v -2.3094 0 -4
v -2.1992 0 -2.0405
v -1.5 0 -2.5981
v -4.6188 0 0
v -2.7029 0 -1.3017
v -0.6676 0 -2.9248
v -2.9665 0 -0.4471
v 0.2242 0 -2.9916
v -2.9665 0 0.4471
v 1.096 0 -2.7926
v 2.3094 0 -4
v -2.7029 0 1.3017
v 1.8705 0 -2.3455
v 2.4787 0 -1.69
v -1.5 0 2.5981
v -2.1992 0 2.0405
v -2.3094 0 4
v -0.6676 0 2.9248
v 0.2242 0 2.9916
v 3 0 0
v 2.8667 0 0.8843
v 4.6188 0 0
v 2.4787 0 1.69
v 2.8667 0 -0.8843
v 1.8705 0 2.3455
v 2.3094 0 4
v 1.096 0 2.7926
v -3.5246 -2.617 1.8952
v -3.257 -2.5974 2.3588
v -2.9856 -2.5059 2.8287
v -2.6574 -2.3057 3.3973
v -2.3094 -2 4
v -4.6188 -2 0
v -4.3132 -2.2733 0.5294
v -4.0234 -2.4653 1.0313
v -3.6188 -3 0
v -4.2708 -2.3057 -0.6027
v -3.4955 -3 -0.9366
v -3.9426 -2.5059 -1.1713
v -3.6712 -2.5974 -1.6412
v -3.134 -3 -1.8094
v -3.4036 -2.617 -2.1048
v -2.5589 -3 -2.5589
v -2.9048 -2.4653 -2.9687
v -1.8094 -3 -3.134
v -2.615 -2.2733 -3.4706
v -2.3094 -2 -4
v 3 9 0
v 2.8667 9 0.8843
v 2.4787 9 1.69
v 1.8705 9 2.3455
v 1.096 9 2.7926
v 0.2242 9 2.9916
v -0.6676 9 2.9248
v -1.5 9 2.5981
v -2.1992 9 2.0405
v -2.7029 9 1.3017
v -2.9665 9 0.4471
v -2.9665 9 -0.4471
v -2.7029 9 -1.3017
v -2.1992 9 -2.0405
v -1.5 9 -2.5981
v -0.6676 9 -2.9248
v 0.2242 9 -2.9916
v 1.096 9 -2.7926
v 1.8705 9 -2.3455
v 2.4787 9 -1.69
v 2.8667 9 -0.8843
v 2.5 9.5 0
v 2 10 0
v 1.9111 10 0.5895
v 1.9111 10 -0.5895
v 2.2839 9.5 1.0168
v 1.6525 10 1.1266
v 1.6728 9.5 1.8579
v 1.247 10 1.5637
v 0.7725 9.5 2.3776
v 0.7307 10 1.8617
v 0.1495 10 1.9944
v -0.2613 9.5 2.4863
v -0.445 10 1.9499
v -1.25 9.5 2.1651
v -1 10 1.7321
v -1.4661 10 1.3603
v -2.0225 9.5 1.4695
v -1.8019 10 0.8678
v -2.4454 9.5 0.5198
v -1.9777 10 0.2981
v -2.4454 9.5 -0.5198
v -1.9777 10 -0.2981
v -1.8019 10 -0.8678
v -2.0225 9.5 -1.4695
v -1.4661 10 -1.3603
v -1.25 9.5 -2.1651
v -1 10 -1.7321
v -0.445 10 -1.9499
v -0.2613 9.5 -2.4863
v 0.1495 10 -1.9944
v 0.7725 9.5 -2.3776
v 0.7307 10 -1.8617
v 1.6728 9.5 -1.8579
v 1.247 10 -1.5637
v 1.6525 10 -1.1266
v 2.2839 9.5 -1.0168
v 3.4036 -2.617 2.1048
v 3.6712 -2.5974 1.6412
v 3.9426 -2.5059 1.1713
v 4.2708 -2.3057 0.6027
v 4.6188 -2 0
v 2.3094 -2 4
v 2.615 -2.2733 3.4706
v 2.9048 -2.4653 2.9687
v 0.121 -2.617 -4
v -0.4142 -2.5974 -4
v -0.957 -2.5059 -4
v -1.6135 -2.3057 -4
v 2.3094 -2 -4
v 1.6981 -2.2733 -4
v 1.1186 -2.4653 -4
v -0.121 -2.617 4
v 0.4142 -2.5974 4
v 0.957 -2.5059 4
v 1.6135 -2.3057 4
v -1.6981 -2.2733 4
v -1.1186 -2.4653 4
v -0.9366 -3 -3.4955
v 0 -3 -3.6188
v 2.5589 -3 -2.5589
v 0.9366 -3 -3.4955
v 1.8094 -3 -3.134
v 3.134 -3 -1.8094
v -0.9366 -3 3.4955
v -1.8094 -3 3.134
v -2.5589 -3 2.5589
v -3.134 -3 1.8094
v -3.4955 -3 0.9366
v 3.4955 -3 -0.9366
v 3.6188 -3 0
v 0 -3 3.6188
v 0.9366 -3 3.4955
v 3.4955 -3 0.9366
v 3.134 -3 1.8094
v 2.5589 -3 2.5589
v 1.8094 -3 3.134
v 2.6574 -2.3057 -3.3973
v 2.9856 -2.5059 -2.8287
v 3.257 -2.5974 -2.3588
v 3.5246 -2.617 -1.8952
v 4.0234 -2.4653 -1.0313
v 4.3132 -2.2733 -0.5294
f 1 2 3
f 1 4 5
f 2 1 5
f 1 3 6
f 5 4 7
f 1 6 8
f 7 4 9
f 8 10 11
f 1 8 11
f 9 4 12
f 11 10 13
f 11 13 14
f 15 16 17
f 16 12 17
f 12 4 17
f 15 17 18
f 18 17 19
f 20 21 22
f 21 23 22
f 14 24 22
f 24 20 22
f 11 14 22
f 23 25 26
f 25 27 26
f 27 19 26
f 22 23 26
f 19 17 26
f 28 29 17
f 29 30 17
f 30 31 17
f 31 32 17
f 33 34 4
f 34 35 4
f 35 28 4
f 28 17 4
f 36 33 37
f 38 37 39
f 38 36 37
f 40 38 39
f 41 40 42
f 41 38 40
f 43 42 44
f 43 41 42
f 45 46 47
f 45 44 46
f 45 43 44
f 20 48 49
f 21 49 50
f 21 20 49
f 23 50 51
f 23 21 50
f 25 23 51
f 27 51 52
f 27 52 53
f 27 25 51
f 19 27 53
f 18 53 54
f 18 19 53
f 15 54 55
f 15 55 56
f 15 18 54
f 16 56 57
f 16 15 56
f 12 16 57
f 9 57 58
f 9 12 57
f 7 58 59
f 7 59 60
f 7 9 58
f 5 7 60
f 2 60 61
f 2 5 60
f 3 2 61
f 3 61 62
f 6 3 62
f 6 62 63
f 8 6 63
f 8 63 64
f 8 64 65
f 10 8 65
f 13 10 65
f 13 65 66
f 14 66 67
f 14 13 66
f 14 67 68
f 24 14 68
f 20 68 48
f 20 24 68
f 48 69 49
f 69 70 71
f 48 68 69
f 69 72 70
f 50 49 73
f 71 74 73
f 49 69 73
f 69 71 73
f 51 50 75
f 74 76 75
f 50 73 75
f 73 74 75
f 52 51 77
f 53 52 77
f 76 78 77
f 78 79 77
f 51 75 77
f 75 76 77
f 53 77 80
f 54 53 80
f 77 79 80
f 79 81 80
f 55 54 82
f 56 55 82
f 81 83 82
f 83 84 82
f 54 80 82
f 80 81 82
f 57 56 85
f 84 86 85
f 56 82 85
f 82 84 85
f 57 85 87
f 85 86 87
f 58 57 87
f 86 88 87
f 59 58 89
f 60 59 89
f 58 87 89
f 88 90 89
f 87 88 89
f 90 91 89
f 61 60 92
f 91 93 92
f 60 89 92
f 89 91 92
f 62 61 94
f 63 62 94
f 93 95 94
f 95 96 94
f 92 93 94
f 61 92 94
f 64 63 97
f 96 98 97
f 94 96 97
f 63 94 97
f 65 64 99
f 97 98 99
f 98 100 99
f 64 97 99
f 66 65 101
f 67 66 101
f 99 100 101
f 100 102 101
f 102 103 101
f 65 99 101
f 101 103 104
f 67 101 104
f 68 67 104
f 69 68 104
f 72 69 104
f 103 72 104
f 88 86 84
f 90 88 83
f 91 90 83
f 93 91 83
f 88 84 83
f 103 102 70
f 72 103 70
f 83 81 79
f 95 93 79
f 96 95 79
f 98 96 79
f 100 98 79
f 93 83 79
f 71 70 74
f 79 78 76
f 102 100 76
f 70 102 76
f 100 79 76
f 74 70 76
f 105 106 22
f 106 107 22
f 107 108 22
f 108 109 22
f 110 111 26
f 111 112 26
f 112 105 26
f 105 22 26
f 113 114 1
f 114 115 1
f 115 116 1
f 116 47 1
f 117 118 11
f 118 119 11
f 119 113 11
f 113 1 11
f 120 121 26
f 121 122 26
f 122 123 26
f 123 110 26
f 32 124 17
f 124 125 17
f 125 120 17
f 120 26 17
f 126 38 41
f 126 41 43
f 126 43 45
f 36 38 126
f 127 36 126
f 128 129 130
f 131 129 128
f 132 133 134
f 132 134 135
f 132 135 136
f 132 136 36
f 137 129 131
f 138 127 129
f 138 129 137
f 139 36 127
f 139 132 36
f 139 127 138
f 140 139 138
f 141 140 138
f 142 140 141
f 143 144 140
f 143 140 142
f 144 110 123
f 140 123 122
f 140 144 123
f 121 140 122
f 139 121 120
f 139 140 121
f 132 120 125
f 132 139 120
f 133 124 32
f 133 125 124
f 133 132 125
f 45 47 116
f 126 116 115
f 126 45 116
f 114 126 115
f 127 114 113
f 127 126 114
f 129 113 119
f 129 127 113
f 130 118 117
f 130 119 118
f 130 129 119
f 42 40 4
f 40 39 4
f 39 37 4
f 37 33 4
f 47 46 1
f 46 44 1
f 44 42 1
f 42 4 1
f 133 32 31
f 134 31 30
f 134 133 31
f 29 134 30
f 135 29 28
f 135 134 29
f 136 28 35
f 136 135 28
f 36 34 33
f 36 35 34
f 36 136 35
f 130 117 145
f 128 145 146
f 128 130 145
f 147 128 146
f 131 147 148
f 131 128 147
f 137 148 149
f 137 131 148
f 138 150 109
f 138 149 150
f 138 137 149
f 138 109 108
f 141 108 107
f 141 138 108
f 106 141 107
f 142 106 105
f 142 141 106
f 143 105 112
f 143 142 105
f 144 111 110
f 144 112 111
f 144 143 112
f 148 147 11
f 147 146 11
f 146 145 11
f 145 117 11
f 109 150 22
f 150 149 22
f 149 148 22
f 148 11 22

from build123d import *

# Parameters (mm, degrees)
F0_R     = 3
F1_DEPTH = 3
F2_SIZE  = 1
F3_DEPTH = 25
F4_DEPTH = 10
F5_SIZE  = 1


with BuildPart() as f1:
    # F0 (on Front) → F1 (new body)
    with BuildSketch(Plane.XZ):
        with BuildLine():
            ThreePointArc((2.3094010768, 4), (0, 4.6188021535), (-2.3094010768, 4))
            Line((-2.3094010768, 4), (2.3094010768, 4))
        make_face()
        Polygon((2.3094010768, 4), (-2.3094010768, 4), (-4.6188021535, 0), (-2.3094010768, -4), (2.3094010768, -4), (4.6188021535, 0), align=None)
        Circle(F0_R, mode=Mode.SUBTRACT)
        with BuildLine():
            Line((-4.6188021535, 0), (-2.3094010768, 4))
            ThreePointArc((-2.3094010768, 4), (-4, 2.3094010768), (-4.6188021535, 0))
        make_face()
        with BuildLine():
            ThreePointArc((4.6188021535, 0), (4, 2.3094010768), (2.3094010768, 4))
            Line((2.3094010768, 4), (4.6188021535, 0))
        make_face()
        with BuildLine():
            Line((-2.3094010768, -4), (-4.6188021535, 0))
            ThreePointArc((-4.6188021535, 0), (-4, -2.3094010768), (-2.3094010768, -4))
        make_face()
        with BuildLine():
            ThreePointArc((2.3094010768, -4), (4, -2.3094010768), (4.6188021535, 0))
            Line((4.6188021535, 0), (2.3094010768, -4))
        make_face()
        with BuildLine():
            Line((2.3094010768, -4), (-2.3094010768, -4))
            ThreePointArc((-2.3094010768, -4), (0, -4.6188021535), (2.3094010768, -4))
        make_face()
        Circle(F0_R)
    extrude(amount=F1_DEPTH)

    # F2
    f2_edges = [f1.edges().sort_by_distance(p)[0] for p in [
        (2.309401, -3, 4),
    ]]
    chamfer(f2_edges, length=F2_SIZE)

    # F0 (on Front) → F3 (intersect)
    with BuildSketch(Plane.XZ):
        Polygon((2.3094010768, 4), (-2.3094010768, 4), (-4.6188021535, 0), (-2.3094010768, -4), (2.3094010768, -4), (4.6188021535, 0), align=None)
        Circle(F0_R, mode=Mode.SUBTRACT)
        Circle(F0_R)
    extrude(amount=F3_DEPTH, mode=Mode.INTERSECT)

    # F0 (on Front) → F4 (join)
    with BuildSketch(Plane.XZ):
        Circle(F0_R)
    extrude(amount=-F4_DEPTH)

    # F5
    f5_edges = [f1.edges().sort_by_distance(p)[0] for p in [
        (-3, 10, 0),
    ]]
    chamfer(f5_edges, length=F5_SIZE)


solid = f1.part
